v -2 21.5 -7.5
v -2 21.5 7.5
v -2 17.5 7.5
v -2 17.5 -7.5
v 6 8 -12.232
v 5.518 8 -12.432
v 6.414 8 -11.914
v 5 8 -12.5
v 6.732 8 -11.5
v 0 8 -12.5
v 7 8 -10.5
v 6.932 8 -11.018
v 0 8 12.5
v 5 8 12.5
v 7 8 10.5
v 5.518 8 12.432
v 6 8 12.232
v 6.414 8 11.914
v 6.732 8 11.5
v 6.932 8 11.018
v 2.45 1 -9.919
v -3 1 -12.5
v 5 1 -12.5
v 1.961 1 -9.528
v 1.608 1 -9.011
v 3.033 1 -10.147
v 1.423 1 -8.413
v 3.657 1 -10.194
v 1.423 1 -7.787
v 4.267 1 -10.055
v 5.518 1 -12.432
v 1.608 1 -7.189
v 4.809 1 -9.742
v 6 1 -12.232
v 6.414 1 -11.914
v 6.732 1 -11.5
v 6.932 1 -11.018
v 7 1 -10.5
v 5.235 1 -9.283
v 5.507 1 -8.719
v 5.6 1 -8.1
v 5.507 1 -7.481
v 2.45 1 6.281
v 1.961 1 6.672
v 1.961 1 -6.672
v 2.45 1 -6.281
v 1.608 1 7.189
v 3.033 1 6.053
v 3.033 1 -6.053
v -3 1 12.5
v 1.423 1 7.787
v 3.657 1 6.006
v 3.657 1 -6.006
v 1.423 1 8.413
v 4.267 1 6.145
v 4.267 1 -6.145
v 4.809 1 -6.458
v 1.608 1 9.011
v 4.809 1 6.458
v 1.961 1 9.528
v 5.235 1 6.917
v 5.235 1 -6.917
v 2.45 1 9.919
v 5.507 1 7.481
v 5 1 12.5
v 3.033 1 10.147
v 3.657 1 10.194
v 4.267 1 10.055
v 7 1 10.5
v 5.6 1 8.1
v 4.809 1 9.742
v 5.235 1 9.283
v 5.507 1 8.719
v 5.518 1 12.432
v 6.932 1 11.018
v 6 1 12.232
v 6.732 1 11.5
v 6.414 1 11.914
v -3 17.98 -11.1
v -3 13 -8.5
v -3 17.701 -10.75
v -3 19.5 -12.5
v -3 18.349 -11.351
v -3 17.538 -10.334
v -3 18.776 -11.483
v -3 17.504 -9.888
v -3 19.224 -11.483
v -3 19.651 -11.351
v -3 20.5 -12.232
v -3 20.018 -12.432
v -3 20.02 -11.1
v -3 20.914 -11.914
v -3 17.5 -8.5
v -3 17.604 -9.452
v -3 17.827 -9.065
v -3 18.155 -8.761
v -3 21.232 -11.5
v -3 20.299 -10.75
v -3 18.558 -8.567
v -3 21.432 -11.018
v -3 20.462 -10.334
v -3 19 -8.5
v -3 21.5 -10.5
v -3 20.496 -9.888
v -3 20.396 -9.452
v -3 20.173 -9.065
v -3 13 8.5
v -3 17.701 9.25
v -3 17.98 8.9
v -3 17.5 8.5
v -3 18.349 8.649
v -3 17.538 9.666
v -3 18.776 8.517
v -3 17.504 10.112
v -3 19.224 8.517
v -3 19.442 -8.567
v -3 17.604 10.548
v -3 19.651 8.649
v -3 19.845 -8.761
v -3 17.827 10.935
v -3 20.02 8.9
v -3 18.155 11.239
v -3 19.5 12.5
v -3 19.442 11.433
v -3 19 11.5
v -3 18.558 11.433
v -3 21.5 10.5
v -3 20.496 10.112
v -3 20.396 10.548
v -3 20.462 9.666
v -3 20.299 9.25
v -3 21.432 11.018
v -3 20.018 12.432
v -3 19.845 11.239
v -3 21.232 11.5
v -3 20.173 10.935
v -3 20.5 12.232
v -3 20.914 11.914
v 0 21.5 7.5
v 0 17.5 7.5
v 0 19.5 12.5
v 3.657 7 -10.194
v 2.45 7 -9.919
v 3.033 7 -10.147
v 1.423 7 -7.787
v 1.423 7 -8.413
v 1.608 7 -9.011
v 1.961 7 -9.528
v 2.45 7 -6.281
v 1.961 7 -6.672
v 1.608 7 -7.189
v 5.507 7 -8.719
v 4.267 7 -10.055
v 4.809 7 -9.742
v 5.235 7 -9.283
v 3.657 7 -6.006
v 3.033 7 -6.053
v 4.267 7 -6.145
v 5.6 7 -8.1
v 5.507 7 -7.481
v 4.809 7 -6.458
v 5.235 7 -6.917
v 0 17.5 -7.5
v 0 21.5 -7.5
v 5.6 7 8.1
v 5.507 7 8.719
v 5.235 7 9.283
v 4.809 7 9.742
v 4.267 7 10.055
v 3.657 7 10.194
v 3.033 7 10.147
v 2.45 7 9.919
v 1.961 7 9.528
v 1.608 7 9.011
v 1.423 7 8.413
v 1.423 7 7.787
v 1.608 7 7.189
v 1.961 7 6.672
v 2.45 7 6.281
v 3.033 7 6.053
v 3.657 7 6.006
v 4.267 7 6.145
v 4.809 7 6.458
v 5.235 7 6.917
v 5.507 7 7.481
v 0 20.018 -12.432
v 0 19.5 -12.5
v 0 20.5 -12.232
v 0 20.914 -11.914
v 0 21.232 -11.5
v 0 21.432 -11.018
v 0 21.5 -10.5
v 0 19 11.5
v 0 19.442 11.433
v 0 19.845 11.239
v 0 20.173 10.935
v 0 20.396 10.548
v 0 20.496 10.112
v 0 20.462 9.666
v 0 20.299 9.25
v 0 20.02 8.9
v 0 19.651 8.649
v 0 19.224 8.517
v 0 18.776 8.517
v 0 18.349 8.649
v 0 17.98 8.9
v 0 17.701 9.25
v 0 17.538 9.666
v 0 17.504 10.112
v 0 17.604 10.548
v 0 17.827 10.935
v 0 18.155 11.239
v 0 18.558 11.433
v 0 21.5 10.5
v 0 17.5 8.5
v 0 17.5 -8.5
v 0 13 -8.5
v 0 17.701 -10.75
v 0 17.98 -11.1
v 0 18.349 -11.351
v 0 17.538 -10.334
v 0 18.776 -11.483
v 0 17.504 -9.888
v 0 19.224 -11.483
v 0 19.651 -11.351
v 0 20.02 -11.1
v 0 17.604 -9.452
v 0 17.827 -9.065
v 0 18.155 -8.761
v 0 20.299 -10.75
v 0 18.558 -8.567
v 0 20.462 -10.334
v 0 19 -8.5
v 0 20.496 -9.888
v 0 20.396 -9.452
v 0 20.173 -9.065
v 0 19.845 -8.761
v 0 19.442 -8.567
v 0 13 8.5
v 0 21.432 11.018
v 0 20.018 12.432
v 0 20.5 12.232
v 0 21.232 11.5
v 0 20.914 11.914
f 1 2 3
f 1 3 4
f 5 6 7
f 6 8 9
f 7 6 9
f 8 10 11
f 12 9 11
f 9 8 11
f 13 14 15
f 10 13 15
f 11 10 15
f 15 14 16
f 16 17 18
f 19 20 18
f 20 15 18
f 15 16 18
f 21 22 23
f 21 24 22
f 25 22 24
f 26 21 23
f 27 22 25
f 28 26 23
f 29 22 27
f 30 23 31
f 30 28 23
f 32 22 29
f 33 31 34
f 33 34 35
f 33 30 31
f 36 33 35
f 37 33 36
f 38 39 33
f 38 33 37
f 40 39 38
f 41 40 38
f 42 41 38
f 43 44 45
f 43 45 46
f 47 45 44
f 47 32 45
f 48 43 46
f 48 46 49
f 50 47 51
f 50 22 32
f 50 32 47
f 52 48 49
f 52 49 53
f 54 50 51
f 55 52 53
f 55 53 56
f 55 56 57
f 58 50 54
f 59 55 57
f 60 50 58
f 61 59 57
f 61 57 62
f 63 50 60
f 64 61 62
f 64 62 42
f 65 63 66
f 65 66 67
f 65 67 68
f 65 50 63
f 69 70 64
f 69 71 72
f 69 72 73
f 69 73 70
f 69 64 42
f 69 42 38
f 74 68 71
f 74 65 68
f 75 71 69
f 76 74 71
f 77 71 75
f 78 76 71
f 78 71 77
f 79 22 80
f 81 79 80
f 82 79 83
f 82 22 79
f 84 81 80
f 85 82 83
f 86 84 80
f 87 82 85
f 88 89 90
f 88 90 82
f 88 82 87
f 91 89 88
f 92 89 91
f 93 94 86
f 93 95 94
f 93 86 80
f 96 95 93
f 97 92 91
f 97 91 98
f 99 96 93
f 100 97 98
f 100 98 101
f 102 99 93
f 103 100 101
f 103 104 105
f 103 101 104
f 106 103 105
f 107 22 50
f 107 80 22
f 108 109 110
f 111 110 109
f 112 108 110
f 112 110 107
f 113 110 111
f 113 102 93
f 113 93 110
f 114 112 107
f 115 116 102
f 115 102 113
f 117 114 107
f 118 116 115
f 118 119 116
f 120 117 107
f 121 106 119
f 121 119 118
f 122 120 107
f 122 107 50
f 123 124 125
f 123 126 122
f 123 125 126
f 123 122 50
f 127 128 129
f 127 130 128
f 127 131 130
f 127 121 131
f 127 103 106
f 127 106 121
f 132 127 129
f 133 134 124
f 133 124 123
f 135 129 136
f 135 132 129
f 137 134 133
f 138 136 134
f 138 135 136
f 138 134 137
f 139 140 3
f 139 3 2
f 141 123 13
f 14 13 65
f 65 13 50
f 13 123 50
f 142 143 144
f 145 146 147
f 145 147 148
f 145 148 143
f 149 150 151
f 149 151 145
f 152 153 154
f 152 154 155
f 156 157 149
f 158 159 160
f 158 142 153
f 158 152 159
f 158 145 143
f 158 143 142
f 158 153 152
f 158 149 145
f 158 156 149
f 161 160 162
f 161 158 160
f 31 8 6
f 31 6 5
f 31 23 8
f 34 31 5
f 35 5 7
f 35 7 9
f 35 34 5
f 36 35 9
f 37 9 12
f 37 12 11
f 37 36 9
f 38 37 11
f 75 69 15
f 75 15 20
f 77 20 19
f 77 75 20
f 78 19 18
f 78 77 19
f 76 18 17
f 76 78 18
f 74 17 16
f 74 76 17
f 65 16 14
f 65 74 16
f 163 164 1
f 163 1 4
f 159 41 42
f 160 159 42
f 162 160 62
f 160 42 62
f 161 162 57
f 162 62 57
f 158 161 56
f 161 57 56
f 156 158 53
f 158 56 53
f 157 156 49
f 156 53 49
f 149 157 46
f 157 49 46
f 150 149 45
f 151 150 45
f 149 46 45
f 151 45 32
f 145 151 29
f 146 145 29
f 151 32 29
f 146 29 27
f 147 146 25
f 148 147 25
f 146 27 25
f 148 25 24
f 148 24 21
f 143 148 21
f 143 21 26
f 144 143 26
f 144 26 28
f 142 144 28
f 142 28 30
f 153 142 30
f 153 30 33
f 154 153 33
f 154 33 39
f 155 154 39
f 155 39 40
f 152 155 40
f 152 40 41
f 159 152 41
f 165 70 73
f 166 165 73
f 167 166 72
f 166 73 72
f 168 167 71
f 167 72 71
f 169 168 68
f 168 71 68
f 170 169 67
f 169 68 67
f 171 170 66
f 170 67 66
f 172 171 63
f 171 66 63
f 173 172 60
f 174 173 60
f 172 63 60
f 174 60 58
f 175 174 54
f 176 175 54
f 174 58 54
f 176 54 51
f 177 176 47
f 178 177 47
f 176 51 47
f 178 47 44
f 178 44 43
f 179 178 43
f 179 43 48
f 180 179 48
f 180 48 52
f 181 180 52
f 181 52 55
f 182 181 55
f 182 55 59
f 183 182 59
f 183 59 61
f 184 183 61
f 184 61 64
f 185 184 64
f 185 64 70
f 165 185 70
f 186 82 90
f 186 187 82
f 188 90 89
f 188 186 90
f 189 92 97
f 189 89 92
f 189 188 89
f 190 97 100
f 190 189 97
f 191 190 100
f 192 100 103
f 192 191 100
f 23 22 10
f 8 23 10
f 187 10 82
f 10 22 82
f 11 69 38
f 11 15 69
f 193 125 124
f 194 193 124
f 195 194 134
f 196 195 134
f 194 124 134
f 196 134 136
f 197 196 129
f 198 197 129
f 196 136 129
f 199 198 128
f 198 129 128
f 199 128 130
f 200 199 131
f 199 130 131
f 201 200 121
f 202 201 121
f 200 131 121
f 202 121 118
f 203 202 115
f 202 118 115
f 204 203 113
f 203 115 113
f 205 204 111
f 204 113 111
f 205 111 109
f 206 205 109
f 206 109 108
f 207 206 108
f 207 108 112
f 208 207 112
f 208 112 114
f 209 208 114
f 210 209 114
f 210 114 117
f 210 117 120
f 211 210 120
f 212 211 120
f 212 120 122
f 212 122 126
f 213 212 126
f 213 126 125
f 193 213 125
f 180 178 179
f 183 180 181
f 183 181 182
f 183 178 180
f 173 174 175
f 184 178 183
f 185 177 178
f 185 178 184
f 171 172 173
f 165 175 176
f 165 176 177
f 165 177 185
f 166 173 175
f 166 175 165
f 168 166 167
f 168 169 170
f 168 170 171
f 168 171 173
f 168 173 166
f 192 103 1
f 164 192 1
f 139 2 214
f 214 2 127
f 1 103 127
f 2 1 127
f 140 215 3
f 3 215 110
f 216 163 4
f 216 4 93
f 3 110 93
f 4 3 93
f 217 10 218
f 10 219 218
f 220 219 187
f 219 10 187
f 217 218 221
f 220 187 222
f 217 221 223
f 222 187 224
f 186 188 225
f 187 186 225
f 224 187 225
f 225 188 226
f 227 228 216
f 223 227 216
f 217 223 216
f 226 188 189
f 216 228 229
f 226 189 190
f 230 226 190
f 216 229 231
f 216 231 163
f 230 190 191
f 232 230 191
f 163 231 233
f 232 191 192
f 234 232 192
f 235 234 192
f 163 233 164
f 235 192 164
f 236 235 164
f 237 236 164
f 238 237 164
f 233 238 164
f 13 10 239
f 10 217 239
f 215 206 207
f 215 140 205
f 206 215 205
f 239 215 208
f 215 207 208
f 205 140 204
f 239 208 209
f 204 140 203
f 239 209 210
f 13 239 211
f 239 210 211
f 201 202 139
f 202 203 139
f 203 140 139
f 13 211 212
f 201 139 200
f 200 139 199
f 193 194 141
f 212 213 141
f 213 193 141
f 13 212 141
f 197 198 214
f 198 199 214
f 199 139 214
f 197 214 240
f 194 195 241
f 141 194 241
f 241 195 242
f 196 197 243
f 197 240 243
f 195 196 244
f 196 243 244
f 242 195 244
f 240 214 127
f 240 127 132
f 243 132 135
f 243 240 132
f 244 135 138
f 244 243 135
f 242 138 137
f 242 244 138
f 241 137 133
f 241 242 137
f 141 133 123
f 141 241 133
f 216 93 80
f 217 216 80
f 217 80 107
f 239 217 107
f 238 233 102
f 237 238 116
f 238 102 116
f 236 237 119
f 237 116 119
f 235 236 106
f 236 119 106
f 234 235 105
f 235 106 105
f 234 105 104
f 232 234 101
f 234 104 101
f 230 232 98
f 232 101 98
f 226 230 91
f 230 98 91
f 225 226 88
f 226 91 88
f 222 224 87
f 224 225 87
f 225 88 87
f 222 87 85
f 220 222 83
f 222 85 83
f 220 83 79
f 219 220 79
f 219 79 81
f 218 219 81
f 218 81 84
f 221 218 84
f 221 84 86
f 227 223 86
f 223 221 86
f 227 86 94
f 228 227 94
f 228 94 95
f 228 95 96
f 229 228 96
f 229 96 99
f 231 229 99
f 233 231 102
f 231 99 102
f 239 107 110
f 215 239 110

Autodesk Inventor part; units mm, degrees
ref_plane "YZ Plane" through (0, 0, 0) normal (1, 0, 0) x (0, 1, 0)
ref_plane "XZ Plane" through (0, 0, 0) normal (0, 1, 0) x (-1, 0, 0)
ref_plane "РабПлоскость7" through (-3, 0, 6) normal (-1, 0, 0) x (0, 0, 1)
sketch "Эскиз3" plane through (-3, 0, 6) normal (-1, 0, 0) x (0, 0, 1)
  line L0 (0, 0) -> (-12, 0) construction
  line L1 (0, 0) -> (0, 23.3031) construction
  line L2 (3, 0) -> (3, 3) construction
  circle A0 centre (-16, 19) radius 1.5
  circle A1 centre (4, 19) radius 1.5
  line L3 (-17.5, 19) -> (-18.5, 19)
  line L4 (-16, 20.5) -> (-16, 21.5)
  line L5 (-18.5, 21.5) -> (6.5, 21.5)
  line L6 (6.5, 21.5) -> (6.5, 13)
  line L7 (-18.5, 13) -> (-18.5, 21.5)
  line L8 (-18.5, 8) -> (-18.5, 13)
  line L9 (6.5, 8) -> (6.5, 13)
  line L10 (2.5, 17.5) -> (-14.5, 17.5)
  line L11 (-14.5, 17.5) -> (-14.5, 13)
  line L12 (-14.5, 13) -> (2.5, 13)
  line L13 (2.5, 13) -> (2.5, 17.5)
  line L14 (-3, 13) -> (-3, 8)
  line L15 (-9, 3) -> (-9, 13) projected
  line L16 (6.5, 8) -> (-4, 8)
  line L17 (-4, 8) -> (-4, 13)
  line L18 (-18.5, 8) -> (-8, 8)
  line L19 (-8, 8) -> (-8, 13)
  line L20 (-8, 8) -> (-4, 8)
  point P0 (-6, 0)
  point P1 (-9, 8)
  point P2 (-9, 8)
  dimension "d55" = 3
  dimension "d56" = 3
  dimension "d57" = 1
  dimension "d58" = 1
  dimension "d59" = 25
  dimension "d68" = 10.5
  dimension "d69" = 10.5
extrude "Выдавливание10" add sketch "Эскиз3" against normal blind 3 contours A0 L4 L5 L6 L9 L16 L14 L12 L13 L10 L11 L15 L18 L8 L7 L3 | A0 L3 L7 L5 L4 | L15 L12 L19 L18 | L16 L17 L12 L14
extrude "Выдавливание12" add sketch "Эскиз3" against normal blind 3 contours L19 L12 L17 L20
sketch "Эскиз5" plane through (-3, 8, -12.5) normal (0, -1, 0) x (1, 0, 0)
  line L0 (7.899, 12.5) -> (3, 12.5) construction
  line L1 (0, 25) -> (10, 25)
  line L2 (10, 25) -> (10, 0)
  line L3 (10, 0) -> (0, 0)
  line L4 (0, 0) -> (0, 25)
  circle A0 centre (6.5, 4.4) radius 2.1
  line L5 (3, 25) -> (6.5, 25)
  line L6 (6.5, 25) -> (6.5, 0)
  circle A1 centre (6.5, 20.6) radius 2.1
  point P0 (8, 5.5)
  point P1 (6.5, 18.5)
  point P2 (6.5, 6.5)
  point P3 (6.5, 4.4)
  dimension "d94" = 10
  dimension "d95" = 25
  dimension "d96" = 4.2
  dimension "d102" = 3.5
extrude "Выдавливание13" [suppressed]
fillet "Сопряжение18" [suppressed]
fillet "Сопряжение19" radius 2 2 edges at (-1.5, 21.5, -12.5) (-1.5, 21.5, 12.5)
extrude "Выдавливание14" add sketch "Эскиз5" along normal blind 7
extrude "Выдавливание15" cut sketch "Эскиз5" against normal blind 6 from surface at 7 contours L6 A0 | A0 L6
fillet "Сопряжение20" radius 2 2 edges at (7, 4.5, -12.5) (7, 4.5, 12.5)
extrude "Выдавливание16" cut sketch "Эскиз5" against normal blind 6 from surface at 7 contours A1 L6 | L6 A1
sketch "Эскиз6" plane through (-3, 0, 6) normal (-1, 0, 0) x (0, 0, 1)
  point P0 (-6, 0)
sketch "Эскиз8" plane through (0, 0, 6) normal (1, 0, 0) x (0, 0, -1)
  circle A0 centre (-4, 19) radius 1.5 construction
  line L0 (-2.5, 19) -> (-1.5, 19) construction
  line L1 (-4.5, 21.5) -> (16.5, 21.5) projected
  line L2 (-2.5, 17.5) -> (14.5, 17.5) projected
  line L3 (-1.5, 21.5) -> (13.5, 21.5) construction
  line L4 (13.5, 21.5) -> (13.5, 17.5)
  line L5 (13.5, 17.5) -> (-1.5, 17.5) construction
  line L6 (-1.5, 17.5) -> (-1.5, 21.5)
  point P0 (6, 0)
  dimension "d105" = 1
  dimension "d106" = 15
extrude "Выдавливание17" cut sketch "Эскиз8" against normal blind 2
properties part number "крепл_ЛД"
